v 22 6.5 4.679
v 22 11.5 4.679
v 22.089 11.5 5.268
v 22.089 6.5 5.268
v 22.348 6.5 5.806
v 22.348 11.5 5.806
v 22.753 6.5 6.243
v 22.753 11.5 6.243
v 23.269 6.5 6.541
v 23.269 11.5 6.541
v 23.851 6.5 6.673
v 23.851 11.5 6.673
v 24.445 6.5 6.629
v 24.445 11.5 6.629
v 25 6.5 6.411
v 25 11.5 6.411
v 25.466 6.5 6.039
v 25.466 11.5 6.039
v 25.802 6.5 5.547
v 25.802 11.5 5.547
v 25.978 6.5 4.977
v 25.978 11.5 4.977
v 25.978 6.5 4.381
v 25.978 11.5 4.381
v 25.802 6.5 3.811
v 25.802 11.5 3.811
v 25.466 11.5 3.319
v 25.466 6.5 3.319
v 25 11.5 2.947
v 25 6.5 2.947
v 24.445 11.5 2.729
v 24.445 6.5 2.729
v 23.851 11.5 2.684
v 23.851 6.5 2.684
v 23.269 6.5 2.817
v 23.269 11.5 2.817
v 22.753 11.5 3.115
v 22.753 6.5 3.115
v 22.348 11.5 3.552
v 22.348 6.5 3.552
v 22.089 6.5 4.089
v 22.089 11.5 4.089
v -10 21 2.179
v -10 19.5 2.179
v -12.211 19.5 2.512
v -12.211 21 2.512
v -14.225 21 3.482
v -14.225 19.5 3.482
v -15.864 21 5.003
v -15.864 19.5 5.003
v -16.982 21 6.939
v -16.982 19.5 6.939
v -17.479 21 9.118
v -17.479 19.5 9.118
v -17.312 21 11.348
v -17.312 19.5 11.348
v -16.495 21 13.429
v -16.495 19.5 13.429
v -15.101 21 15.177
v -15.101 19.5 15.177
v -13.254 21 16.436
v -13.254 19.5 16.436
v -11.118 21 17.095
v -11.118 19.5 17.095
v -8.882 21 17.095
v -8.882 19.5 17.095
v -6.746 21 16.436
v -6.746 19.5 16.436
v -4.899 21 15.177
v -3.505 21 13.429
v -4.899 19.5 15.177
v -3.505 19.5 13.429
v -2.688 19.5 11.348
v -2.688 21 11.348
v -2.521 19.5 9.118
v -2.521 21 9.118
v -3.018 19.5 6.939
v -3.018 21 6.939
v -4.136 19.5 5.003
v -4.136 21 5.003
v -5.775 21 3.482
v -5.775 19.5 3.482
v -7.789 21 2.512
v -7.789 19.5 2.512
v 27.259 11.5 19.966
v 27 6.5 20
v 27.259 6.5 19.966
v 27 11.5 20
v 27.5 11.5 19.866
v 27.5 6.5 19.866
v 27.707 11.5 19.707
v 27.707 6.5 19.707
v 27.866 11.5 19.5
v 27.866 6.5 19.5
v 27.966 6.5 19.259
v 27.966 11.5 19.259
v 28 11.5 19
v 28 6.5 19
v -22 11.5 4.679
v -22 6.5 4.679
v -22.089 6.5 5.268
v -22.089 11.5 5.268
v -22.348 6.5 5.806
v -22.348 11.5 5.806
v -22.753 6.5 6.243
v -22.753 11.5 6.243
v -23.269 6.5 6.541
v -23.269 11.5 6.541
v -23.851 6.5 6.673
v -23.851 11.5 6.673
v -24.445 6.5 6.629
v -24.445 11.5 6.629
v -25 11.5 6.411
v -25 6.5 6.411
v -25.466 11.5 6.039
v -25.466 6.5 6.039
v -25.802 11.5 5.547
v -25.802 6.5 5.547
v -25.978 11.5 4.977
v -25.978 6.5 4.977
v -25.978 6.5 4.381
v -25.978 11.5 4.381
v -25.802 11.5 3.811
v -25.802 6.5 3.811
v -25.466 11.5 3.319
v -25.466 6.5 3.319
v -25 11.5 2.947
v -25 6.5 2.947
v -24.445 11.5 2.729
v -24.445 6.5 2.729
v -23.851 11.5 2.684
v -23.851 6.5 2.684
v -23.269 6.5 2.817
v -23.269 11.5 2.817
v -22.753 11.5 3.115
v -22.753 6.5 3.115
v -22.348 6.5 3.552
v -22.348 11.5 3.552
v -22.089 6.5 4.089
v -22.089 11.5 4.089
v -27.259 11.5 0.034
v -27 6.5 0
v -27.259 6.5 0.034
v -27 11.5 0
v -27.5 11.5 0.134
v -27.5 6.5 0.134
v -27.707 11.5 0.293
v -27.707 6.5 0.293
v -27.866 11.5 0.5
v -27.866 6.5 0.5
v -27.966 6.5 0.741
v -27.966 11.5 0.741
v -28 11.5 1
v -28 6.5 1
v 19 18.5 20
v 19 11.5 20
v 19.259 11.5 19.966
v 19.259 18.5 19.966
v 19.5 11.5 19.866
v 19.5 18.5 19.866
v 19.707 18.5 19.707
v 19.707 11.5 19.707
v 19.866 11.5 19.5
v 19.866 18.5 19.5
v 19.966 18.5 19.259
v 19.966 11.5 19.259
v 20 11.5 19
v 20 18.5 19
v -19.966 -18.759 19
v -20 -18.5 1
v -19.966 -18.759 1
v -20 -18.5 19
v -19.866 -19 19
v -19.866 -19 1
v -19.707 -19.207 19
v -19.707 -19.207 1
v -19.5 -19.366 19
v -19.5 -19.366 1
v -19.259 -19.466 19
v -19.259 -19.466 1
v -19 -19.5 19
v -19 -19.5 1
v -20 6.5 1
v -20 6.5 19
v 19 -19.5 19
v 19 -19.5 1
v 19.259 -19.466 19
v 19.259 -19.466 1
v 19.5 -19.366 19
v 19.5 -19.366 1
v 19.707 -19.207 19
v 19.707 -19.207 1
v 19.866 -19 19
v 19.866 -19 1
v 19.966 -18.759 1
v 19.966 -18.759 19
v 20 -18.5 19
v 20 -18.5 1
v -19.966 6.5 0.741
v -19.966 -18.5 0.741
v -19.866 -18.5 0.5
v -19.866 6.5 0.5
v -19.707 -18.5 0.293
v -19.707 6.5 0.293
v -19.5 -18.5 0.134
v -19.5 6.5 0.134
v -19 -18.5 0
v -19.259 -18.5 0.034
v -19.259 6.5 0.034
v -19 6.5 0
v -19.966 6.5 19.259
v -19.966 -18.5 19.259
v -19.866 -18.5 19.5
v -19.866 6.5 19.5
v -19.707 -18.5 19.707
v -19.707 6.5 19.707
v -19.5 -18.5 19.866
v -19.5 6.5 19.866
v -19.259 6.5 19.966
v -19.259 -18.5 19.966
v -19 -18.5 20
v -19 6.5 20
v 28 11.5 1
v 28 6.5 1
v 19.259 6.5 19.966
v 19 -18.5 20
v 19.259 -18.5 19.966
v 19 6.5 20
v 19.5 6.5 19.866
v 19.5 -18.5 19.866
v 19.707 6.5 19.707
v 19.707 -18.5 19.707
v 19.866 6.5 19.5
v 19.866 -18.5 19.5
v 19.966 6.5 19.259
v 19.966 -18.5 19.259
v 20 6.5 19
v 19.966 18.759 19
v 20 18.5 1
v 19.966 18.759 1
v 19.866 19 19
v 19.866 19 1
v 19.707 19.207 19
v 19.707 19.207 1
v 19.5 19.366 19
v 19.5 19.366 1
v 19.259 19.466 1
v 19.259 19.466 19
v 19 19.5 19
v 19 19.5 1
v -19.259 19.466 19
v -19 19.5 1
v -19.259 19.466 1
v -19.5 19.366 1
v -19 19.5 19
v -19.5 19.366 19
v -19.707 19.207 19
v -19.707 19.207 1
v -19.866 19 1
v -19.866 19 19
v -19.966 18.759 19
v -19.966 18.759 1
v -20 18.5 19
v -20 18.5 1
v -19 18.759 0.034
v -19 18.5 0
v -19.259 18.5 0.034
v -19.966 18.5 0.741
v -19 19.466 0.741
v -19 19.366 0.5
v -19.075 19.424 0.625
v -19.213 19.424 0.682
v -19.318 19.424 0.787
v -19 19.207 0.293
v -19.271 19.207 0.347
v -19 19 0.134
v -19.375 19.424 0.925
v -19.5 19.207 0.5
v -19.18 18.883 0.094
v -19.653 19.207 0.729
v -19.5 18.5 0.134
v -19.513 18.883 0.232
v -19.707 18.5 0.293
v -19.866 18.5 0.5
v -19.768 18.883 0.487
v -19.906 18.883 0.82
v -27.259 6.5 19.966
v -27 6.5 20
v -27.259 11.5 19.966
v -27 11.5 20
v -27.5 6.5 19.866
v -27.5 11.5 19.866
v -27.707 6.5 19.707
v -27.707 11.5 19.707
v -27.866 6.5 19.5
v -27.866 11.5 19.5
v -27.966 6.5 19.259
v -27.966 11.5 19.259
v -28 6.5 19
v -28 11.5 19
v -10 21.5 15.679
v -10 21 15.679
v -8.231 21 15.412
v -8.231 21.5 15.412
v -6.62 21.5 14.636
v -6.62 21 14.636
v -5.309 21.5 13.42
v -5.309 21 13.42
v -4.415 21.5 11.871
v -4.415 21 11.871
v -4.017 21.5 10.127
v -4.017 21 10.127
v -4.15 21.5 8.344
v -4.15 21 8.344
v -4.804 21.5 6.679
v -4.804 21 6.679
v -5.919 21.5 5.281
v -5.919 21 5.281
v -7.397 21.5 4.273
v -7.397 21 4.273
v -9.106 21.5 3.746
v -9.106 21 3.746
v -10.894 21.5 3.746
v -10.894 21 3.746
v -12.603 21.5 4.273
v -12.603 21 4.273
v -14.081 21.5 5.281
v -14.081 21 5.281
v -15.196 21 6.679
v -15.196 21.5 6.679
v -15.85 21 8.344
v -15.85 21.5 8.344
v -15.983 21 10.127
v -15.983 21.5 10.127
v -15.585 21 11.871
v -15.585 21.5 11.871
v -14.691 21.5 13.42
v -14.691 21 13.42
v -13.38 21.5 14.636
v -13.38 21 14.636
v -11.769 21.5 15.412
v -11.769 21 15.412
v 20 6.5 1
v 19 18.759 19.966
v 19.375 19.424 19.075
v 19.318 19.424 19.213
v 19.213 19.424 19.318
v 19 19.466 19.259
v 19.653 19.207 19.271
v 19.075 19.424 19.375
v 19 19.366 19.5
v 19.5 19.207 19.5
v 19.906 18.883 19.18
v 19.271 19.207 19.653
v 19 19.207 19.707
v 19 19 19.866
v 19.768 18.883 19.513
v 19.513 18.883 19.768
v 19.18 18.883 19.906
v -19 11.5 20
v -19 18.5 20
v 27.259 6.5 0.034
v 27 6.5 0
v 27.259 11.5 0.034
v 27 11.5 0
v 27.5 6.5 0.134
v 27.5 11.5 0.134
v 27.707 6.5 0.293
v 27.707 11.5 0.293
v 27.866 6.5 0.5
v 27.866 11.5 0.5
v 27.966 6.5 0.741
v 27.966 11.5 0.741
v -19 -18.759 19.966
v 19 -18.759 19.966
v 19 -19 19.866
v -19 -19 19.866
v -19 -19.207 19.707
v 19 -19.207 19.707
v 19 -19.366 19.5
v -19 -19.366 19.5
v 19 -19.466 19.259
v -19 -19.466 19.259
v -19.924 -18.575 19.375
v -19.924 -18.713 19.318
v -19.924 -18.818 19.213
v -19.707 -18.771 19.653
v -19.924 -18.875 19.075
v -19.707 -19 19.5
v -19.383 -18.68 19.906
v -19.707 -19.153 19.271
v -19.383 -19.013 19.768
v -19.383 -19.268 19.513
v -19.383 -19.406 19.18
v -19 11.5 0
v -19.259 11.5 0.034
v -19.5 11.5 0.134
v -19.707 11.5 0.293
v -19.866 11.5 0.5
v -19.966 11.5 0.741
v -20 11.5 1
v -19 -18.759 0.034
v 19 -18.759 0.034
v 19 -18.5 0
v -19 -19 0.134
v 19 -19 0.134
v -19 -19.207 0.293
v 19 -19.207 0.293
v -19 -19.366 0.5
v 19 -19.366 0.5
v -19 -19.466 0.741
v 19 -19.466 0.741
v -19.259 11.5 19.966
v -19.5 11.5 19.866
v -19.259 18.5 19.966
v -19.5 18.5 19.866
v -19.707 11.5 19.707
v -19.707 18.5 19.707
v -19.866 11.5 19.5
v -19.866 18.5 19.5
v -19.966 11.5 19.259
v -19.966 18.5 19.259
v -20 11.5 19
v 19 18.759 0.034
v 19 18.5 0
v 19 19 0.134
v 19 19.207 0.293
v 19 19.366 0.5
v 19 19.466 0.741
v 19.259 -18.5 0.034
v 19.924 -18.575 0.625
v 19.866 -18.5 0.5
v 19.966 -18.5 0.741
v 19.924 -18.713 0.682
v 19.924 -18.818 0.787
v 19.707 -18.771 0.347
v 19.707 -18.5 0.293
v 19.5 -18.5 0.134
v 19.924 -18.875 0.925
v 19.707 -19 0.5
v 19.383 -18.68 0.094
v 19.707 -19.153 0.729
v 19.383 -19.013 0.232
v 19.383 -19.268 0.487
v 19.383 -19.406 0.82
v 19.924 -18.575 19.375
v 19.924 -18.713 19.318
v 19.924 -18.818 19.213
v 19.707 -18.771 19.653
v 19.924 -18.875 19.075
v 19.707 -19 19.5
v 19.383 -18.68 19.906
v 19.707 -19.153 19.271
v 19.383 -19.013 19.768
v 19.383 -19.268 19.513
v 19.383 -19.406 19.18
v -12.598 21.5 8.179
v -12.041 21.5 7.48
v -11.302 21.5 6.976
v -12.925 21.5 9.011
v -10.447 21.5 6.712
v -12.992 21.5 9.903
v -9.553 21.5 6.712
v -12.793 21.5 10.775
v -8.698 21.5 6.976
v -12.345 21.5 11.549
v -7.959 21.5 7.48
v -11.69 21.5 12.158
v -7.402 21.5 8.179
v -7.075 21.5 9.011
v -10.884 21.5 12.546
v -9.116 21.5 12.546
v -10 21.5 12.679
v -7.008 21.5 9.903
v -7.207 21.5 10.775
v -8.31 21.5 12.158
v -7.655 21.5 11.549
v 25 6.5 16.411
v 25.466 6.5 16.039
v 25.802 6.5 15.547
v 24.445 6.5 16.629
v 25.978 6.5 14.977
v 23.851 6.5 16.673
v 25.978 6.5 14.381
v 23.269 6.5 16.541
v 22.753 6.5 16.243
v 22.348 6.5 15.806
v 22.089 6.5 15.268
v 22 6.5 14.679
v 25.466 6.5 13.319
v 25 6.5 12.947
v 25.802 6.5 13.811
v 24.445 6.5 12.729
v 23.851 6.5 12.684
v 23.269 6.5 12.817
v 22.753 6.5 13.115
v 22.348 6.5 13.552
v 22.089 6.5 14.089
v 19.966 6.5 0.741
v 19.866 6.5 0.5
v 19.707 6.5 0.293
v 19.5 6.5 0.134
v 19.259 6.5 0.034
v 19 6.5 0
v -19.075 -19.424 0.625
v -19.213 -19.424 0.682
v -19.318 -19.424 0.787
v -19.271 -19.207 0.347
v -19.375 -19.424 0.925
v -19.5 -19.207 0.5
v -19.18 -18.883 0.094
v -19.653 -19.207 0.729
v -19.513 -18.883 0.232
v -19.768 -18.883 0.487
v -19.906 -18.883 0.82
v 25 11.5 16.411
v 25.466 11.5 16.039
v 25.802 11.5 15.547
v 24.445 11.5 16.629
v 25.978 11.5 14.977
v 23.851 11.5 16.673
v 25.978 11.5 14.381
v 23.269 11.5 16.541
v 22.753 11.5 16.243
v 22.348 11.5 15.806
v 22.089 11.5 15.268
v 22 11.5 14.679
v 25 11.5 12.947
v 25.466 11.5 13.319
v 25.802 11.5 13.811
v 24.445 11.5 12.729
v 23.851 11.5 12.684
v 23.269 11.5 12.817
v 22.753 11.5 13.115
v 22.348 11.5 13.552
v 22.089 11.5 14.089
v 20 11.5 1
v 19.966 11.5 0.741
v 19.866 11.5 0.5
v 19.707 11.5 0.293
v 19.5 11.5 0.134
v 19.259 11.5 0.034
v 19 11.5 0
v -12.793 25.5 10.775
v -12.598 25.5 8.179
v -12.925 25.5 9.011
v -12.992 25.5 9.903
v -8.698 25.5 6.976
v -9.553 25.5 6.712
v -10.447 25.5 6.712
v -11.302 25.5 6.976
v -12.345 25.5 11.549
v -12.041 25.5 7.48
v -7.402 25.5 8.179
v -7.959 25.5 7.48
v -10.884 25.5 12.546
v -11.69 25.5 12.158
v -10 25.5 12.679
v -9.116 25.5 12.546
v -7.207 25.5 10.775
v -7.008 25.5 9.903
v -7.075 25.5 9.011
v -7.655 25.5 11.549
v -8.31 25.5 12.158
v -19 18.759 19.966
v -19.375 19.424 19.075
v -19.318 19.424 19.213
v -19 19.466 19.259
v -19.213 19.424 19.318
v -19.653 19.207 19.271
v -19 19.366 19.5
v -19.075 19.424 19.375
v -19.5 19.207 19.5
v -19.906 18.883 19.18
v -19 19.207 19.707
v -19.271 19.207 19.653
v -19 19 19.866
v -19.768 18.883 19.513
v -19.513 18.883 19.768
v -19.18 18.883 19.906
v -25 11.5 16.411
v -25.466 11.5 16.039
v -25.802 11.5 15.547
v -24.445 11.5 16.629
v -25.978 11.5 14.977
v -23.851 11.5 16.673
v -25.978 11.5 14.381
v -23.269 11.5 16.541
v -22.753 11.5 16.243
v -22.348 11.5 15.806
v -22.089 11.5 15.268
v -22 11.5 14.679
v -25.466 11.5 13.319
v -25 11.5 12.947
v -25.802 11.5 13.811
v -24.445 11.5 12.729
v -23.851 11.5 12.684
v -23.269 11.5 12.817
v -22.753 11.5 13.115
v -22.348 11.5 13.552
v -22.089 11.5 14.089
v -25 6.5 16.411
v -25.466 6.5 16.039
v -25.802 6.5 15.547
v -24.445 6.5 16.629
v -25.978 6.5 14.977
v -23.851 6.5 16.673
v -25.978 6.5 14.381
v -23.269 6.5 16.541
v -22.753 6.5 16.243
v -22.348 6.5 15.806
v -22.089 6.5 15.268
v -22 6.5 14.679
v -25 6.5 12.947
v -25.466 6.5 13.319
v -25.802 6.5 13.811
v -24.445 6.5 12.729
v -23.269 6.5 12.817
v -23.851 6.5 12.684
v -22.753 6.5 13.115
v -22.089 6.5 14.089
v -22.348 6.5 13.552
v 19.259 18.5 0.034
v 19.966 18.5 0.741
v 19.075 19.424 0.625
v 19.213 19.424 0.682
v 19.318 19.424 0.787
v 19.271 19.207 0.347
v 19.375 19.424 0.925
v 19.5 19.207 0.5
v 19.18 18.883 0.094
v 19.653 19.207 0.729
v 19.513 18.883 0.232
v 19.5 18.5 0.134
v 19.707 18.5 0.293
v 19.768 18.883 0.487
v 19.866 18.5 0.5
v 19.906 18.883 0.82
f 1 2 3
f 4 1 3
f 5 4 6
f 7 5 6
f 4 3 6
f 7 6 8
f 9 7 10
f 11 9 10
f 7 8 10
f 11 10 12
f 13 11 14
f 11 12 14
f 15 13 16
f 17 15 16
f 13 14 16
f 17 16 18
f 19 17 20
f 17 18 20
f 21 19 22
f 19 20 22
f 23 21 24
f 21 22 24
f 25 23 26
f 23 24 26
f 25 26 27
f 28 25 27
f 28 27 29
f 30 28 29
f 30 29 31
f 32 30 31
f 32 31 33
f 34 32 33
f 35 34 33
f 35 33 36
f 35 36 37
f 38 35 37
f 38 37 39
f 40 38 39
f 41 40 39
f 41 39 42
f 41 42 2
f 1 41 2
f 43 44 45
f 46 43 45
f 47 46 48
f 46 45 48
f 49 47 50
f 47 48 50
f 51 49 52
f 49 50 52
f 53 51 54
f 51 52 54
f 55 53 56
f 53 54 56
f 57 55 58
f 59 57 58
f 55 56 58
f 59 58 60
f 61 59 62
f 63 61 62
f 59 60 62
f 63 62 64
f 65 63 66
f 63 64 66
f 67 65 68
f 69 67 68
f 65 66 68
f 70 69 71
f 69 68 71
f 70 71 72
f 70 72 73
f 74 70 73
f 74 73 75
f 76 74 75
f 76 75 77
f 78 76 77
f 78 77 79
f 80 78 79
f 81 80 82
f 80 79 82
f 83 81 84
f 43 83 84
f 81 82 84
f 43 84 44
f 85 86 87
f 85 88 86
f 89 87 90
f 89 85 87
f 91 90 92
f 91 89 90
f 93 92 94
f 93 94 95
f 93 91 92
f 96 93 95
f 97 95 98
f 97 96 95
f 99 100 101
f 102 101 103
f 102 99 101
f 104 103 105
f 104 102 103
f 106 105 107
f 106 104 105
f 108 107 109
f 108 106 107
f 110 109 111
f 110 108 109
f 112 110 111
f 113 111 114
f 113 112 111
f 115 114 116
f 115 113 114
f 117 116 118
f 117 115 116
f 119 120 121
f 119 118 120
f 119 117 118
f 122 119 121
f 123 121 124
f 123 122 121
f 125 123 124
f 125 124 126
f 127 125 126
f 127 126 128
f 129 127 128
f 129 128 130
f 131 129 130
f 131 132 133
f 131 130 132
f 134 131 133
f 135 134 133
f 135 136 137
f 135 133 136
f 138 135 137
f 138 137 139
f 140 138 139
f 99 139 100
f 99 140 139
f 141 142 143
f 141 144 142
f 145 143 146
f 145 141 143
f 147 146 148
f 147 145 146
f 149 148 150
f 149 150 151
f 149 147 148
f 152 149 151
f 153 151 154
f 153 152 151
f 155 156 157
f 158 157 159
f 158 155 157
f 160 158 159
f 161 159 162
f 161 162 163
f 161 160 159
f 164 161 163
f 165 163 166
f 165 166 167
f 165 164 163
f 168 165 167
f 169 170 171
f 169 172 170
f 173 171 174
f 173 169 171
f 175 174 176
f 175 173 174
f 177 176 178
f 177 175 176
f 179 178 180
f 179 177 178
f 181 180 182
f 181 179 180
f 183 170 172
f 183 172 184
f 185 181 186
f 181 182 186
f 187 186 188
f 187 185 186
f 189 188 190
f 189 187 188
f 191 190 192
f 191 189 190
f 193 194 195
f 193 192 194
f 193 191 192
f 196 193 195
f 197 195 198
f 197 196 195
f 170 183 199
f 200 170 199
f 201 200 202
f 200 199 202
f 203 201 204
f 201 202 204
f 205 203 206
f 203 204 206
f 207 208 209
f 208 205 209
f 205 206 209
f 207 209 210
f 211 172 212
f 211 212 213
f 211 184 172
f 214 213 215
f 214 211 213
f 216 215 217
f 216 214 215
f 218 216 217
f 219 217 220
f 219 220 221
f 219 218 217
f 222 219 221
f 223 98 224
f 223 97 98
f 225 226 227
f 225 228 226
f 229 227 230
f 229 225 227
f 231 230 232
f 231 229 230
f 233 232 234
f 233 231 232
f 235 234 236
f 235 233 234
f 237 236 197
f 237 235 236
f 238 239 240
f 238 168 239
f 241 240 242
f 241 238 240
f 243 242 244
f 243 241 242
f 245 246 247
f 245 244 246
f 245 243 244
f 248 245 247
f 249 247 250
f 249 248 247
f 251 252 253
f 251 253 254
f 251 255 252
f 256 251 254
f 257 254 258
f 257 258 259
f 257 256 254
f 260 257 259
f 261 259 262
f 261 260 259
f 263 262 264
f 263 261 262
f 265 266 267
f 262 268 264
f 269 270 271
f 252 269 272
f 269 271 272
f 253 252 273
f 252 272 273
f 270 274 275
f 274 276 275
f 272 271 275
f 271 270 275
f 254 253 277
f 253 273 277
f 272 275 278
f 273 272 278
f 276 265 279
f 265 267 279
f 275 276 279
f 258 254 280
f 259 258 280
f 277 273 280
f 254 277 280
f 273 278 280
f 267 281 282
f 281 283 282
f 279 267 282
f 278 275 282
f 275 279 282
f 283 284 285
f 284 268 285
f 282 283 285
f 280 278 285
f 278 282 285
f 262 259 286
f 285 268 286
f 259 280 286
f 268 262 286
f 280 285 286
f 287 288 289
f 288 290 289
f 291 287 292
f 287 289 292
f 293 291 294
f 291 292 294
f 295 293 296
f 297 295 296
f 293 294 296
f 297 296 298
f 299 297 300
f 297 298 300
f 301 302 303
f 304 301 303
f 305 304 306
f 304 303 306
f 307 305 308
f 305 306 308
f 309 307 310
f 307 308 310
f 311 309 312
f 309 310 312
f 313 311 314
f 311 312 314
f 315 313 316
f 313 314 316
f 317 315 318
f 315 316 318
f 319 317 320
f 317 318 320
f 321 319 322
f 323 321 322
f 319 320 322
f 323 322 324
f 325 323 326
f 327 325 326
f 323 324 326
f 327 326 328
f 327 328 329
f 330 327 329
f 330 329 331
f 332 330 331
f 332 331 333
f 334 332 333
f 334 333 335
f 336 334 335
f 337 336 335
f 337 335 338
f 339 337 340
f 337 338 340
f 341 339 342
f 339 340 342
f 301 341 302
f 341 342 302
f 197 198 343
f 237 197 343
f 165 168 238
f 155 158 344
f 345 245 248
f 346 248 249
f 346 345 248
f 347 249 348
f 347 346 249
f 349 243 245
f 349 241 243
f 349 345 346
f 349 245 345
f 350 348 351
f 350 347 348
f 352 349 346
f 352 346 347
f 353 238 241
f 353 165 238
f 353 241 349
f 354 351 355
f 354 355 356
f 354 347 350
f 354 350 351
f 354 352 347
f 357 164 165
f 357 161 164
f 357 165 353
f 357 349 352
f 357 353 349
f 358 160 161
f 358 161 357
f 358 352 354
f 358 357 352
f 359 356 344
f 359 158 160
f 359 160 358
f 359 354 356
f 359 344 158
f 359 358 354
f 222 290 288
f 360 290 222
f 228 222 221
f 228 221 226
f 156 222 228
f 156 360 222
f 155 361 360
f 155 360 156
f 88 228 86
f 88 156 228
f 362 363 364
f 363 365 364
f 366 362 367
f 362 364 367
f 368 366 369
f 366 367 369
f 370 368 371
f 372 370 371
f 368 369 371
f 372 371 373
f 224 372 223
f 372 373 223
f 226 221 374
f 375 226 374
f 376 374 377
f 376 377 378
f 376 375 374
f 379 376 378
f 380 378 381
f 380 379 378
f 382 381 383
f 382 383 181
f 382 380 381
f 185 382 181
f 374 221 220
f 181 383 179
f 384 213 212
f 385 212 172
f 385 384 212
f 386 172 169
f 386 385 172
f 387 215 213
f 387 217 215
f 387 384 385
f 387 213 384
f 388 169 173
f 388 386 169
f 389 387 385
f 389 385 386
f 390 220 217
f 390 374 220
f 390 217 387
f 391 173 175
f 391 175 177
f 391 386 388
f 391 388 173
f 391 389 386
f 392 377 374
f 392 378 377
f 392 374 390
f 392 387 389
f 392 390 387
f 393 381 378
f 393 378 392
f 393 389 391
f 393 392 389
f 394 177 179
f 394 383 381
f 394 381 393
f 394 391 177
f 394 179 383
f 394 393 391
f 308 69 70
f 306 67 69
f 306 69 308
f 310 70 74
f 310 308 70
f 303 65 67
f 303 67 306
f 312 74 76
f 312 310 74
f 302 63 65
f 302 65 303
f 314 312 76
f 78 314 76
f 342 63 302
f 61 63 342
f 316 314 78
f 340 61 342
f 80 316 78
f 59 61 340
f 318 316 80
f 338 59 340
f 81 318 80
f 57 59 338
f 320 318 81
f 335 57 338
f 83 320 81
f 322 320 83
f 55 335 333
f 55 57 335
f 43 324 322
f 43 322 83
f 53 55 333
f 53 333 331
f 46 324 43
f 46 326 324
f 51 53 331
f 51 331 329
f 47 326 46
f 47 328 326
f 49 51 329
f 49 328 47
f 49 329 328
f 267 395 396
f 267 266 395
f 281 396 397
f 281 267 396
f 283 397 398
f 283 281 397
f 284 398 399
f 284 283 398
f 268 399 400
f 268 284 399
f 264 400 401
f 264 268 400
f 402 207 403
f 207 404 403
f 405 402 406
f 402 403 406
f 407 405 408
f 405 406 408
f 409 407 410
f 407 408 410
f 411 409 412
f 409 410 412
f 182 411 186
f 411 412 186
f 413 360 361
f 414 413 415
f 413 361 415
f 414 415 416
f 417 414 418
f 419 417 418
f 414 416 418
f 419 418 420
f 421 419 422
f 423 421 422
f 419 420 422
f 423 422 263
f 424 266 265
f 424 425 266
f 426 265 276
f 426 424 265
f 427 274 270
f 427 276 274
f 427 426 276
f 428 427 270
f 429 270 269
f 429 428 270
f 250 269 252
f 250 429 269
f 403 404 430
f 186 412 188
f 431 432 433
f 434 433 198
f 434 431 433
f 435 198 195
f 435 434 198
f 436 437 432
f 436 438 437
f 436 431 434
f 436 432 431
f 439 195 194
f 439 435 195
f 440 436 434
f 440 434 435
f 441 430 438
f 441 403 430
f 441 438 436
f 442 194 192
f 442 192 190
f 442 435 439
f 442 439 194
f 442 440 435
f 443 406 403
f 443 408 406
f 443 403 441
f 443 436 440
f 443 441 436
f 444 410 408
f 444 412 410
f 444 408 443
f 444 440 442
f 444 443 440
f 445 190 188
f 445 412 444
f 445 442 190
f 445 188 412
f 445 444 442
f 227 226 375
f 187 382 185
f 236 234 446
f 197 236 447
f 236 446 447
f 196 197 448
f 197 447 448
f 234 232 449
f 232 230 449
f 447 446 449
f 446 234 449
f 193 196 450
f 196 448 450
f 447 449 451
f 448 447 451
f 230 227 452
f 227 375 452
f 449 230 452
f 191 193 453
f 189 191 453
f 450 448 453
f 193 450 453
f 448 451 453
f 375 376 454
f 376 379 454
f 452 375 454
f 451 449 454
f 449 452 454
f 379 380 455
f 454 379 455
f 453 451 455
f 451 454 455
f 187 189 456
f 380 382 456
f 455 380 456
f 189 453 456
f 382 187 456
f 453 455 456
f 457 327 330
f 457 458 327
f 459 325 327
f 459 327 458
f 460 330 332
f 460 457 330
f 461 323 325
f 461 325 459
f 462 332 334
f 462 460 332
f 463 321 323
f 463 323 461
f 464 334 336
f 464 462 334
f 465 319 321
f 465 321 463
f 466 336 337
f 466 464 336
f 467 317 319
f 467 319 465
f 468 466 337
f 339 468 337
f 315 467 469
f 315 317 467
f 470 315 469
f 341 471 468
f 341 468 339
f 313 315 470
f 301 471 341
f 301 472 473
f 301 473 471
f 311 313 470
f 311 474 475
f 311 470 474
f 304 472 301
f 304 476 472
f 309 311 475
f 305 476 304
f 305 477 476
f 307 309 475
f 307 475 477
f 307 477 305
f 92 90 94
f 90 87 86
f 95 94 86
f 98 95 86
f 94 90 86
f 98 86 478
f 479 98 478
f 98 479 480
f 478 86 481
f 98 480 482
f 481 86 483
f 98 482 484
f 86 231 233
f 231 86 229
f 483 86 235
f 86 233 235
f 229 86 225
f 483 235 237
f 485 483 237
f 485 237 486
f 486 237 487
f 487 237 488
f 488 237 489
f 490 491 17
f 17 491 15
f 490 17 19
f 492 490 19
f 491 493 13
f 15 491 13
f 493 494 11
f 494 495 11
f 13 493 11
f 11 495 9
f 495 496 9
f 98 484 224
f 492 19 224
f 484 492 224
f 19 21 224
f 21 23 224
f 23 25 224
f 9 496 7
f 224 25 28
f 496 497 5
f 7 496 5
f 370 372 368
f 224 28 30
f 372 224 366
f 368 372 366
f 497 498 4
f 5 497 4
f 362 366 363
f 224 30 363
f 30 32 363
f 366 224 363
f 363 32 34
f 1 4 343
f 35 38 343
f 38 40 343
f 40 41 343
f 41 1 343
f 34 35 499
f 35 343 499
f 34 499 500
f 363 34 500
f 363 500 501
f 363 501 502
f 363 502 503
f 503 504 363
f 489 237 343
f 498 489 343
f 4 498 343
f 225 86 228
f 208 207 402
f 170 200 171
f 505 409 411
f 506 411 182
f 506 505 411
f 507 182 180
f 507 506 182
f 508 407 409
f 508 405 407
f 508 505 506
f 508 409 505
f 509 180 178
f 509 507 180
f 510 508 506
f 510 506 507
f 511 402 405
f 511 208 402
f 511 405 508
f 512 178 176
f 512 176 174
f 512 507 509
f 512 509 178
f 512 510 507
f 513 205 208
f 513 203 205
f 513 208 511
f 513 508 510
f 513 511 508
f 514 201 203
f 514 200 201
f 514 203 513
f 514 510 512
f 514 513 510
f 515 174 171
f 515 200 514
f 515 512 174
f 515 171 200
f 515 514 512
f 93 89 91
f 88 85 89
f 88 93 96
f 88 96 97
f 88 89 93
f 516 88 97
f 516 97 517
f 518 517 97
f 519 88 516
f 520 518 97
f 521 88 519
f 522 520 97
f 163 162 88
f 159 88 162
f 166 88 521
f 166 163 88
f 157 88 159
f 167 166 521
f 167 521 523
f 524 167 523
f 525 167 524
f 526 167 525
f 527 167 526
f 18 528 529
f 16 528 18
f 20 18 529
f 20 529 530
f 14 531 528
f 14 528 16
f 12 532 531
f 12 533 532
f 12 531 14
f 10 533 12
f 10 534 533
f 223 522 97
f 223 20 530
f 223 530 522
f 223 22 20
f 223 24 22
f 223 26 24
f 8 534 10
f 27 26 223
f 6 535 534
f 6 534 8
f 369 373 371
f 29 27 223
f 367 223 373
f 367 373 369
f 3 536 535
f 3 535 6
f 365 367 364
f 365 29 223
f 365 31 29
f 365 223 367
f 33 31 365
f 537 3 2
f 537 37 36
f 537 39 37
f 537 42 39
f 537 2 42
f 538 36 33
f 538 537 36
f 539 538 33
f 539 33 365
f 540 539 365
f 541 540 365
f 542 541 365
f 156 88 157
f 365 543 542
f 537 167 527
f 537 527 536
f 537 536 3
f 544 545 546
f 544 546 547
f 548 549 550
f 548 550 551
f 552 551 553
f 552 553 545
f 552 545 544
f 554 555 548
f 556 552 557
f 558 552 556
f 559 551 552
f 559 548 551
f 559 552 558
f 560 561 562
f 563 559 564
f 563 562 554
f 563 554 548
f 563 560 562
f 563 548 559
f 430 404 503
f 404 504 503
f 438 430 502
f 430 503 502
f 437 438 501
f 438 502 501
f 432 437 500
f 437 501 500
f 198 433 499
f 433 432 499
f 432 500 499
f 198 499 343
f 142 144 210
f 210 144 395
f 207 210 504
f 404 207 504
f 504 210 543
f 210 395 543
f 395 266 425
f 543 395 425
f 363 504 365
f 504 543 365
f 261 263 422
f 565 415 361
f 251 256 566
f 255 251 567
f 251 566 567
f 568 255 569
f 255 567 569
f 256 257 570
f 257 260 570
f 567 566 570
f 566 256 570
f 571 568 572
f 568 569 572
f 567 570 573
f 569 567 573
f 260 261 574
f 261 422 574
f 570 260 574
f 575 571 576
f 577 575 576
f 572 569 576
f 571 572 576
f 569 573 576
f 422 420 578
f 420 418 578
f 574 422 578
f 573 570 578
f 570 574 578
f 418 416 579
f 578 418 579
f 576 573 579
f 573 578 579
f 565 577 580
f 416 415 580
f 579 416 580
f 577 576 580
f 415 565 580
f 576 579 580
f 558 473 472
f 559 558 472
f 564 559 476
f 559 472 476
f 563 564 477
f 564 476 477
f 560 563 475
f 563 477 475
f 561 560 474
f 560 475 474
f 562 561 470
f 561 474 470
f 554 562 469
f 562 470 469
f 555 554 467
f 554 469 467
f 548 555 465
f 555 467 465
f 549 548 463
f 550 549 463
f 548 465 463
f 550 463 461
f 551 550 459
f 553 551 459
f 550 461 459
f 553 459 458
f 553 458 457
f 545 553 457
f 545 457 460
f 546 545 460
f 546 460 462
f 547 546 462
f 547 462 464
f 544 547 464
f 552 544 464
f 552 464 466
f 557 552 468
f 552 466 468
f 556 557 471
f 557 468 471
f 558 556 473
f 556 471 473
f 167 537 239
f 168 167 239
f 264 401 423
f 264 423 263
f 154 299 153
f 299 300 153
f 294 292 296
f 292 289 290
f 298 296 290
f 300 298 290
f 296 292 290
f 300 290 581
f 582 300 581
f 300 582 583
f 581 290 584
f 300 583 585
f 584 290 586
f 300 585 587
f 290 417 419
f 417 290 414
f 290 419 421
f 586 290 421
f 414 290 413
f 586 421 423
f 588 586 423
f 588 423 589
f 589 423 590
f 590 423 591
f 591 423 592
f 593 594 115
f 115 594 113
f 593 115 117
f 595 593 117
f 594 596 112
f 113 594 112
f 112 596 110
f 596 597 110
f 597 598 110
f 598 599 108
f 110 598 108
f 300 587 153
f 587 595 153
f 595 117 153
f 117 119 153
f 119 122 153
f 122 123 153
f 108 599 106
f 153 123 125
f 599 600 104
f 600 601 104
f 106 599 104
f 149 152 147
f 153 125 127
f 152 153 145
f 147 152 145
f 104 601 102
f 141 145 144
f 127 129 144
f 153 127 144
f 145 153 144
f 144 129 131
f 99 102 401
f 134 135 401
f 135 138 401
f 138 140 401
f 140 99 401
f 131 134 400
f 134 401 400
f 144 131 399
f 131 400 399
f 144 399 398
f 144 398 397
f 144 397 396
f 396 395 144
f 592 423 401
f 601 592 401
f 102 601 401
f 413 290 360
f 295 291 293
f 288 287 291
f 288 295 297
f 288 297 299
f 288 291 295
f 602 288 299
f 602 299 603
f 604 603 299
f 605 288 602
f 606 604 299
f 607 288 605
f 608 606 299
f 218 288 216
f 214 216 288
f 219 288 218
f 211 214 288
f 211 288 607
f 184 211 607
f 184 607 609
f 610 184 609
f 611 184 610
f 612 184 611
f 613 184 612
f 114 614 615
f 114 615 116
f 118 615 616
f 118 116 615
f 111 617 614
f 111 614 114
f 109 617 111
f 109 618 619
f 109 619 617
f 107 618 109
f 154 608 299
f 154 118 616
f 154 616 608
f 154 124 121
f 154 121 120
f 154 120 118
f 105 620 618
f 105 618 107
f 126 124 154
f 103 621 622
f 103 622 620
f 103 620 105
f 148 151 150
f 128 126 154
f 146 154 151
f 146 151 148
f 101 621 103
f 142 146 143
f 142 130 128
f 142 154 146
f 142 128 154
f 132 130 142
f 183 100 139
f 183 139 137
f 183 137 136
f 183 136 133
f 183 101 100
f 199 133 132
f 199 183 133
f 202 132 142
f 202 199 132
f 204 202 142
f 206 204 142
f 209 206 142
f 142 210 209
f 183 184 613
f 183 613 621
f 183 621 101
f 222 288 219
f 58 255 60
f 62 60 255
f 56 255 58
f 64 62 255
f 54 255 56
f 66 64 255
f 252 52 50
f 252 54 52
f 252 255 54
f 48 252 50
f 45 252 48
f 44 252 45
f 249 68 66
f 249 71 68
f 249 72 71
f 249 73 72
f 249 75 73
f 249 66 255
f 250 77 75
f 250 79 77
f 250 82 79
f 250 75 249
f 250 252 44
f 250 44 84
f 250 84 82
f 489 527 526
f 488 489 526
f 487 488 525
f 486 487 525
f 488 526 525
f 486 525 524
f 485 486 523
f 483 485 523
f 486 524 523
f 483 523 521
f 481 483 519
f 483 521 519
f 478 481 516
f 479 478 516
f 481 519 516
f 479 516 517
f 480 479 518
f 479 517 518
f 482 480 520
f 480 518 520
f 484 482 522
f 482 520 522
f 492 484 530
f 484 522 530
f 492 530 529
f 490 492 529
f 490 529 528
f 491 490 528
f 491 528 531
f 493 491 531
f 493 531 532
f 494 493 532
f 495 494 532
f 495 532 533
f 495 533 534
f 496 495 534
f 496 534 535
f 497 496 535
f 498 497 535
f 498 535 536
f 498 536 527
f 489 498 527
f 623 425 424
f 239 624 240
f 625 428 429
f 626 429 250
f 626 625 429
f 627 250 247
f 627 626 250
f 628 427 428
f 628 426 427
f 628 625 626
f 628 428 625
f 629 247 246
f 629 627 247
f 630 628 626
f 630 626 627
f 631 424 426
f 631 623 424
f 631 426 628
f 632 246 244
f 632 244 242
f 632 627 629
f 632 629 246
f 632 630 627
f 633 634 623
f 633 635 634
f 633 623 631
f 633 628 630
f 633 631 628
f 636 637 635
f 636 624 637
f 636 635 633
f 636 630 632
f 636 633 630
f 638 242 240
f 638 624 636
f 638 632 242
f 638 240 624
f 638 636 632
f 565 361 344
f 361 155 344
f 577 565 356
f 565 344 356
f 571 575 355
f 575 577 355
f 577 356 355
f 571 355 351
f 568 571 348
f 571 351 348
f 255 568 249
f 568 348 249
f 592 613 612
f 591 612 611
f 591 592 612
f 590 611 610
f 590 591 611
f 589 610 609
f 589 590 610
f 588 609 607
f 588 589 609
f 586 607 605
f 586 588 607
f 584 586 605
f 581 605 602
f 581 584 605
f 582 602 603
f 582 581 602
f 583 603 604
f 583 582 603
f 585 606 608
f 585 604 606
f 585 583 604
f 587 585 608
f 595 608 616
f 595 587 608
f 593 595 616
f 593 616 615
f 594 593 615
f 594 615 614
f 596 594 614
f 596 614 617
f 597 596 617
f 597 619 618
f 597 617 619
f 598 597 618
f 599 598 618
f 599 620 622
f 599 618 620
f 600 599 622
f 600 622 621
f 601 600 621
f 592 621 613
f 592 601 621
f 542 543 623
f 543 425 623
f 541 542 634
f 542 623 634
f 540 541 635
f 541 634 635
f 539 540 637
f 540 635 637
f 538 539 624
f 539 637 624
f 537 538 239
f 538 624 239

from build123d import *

# Parameters (mm, degrees)
SKETCH_1_W          = 40
SKETCH_1_H          = 39
EXTRUDE_1_DEPTH     = 20
SKETCH_2_W          = 20
SKETCH_2_H          = 5
EXTRUDE_2_DEPTH     = 8
SKETCH_3_R          = 2
CUT_EXTRUDE_1_DEPTH = 8
SKETCH_4_R          = 7.5
EXTRUDE_3_DEPTH     = 1.5
SKETCH_5_R          = 6
EXTRUDE_4_DEPTH     = 0.5
SKETCH_6_R          = 3
EXTRUDE_5_DEPTH     = 4
FILLET_1_R          = 1


with BuildPart() as part:
    # 草图1 → 凸台-拉伸1 (new body)
    with BuildSketch(Plane.XY):
        Rectangle(SKETCH_1_W, SKETCH_1_H)
    extrude(amount=EXTRUDE_1_DEPTH)

    # 草图2 → 凸台-拉伸2 (add)
    with BuildSketch(Plane(origin=(20, 0, 0), x_dir=(0, 0, -1), z_dir=(1, 0, 0))):
        with Locations((-10, 9)):
            Rectangle(SKETCH_2_W, SKETCH_2_H)
    extrude_2 = extrude(amount=EXTRUDE_2_DEPTH)

    # 草图3 → 切除-拉伸1 (cut)
    with BuildSketch(Plane(origin=(0, 11.5, 0), x_dir=(1, 0, 0), z_dir=(0, 1, 0))):
        with Locations(Location((24, -4.678896128, 0), (0, 0, 180))):
            Circle(SKETCH_3_R)
        with Locations(Location((24, -14.678896128, 0), (0, 0, 180))):
            Circle(SKETCH_3_R)
    cut_extrude_1 = extrude(amount=-CUT_EXTRUDE_1_DEPTH, mode=Mode.SUBTRACT)

    # 镜向1: 凸台-拉伸2, 切除-拉伸1 across plane
    add(extrude_2.mirror(Plane(origin=(0, 0, 0), x_dir=(0, 0, 1), z_dir=(1, 0, 0))))
    add(cut_extrude_1.mirror(Plane(origin=(0, 0, 0), x_dir=(0, 0, 1), z_dir=(1, 0, 0))), mode=Mode.SUBTRACT)

    # 草图4 → 凸台-拉伸3 (add)
    with BuildSketch(Plane(origin=(0, 19.5, 0), x_dir=(1, 0, 0), z_dir=(0, 1, 0))):
        with Locations(Location((-10, -9.678896128, 0), (0, 0, 90))):
            Circle(SKETCH_4_R)
    extrude(amount=EXTRUDE_3_DEPTH)

    # 草图5 → 凸台-拉伸4 (add)
    with BuildSketch(Plane(origin=(0, 21, 0), x_dir=(1, 0, 0), z_dir=(0, 1, 0))):
        with Locations(Location((-10, -9.678896128, 0), (0, 0, 270))):
            Circle(SKETCH_5_R)
    extrude(amount=EXTRUDE_4_DEPTH)

    # 草图6 → 凸台-拉伸5 (add)
    with BuildSketch(Plane(origin=(0, 21.5, 0), x_dir=(1, 0, 0), z_dir=(0, 1, 0))):
        with Locations(Location((-10, -9.678896128, 0), (0, 0, 270))):
            Circle(SKETCH_6_R)
    extrude(amount=EXTRUDE_5_DEPTH)

    # 圆角1
    fillet_1_edges = [part.edges().sort_by_distance(p)[0] for p in [
        (-20, 15.5, 20),
        (20, 15.5, 0),
        (20, 15.5, 20),
        (0, -19.5, 20),
        (28, 9, 20),
        (28, 9, 0),
        (-20, -6.5, 0),
        (-20, -6.5, 20),
        (-28, 9, 20),
        (-28, 9, 0),
        (20, -6.5, 20),
        (0, -19.5, 0),
        (-20, 15.5, 0),
        (0, 19.5, 0),
        (20, -6.5, 0),
        (20, -19.5, 10),
        (-20, -19.5, 10),
        (-20, 19.5, 10),
        (20, 19.5, 10),
        (0, 19.5, 20),
    ]]
    fillet(fillet_1_edges, radius=FILLET_1_R)


solid = part.part
